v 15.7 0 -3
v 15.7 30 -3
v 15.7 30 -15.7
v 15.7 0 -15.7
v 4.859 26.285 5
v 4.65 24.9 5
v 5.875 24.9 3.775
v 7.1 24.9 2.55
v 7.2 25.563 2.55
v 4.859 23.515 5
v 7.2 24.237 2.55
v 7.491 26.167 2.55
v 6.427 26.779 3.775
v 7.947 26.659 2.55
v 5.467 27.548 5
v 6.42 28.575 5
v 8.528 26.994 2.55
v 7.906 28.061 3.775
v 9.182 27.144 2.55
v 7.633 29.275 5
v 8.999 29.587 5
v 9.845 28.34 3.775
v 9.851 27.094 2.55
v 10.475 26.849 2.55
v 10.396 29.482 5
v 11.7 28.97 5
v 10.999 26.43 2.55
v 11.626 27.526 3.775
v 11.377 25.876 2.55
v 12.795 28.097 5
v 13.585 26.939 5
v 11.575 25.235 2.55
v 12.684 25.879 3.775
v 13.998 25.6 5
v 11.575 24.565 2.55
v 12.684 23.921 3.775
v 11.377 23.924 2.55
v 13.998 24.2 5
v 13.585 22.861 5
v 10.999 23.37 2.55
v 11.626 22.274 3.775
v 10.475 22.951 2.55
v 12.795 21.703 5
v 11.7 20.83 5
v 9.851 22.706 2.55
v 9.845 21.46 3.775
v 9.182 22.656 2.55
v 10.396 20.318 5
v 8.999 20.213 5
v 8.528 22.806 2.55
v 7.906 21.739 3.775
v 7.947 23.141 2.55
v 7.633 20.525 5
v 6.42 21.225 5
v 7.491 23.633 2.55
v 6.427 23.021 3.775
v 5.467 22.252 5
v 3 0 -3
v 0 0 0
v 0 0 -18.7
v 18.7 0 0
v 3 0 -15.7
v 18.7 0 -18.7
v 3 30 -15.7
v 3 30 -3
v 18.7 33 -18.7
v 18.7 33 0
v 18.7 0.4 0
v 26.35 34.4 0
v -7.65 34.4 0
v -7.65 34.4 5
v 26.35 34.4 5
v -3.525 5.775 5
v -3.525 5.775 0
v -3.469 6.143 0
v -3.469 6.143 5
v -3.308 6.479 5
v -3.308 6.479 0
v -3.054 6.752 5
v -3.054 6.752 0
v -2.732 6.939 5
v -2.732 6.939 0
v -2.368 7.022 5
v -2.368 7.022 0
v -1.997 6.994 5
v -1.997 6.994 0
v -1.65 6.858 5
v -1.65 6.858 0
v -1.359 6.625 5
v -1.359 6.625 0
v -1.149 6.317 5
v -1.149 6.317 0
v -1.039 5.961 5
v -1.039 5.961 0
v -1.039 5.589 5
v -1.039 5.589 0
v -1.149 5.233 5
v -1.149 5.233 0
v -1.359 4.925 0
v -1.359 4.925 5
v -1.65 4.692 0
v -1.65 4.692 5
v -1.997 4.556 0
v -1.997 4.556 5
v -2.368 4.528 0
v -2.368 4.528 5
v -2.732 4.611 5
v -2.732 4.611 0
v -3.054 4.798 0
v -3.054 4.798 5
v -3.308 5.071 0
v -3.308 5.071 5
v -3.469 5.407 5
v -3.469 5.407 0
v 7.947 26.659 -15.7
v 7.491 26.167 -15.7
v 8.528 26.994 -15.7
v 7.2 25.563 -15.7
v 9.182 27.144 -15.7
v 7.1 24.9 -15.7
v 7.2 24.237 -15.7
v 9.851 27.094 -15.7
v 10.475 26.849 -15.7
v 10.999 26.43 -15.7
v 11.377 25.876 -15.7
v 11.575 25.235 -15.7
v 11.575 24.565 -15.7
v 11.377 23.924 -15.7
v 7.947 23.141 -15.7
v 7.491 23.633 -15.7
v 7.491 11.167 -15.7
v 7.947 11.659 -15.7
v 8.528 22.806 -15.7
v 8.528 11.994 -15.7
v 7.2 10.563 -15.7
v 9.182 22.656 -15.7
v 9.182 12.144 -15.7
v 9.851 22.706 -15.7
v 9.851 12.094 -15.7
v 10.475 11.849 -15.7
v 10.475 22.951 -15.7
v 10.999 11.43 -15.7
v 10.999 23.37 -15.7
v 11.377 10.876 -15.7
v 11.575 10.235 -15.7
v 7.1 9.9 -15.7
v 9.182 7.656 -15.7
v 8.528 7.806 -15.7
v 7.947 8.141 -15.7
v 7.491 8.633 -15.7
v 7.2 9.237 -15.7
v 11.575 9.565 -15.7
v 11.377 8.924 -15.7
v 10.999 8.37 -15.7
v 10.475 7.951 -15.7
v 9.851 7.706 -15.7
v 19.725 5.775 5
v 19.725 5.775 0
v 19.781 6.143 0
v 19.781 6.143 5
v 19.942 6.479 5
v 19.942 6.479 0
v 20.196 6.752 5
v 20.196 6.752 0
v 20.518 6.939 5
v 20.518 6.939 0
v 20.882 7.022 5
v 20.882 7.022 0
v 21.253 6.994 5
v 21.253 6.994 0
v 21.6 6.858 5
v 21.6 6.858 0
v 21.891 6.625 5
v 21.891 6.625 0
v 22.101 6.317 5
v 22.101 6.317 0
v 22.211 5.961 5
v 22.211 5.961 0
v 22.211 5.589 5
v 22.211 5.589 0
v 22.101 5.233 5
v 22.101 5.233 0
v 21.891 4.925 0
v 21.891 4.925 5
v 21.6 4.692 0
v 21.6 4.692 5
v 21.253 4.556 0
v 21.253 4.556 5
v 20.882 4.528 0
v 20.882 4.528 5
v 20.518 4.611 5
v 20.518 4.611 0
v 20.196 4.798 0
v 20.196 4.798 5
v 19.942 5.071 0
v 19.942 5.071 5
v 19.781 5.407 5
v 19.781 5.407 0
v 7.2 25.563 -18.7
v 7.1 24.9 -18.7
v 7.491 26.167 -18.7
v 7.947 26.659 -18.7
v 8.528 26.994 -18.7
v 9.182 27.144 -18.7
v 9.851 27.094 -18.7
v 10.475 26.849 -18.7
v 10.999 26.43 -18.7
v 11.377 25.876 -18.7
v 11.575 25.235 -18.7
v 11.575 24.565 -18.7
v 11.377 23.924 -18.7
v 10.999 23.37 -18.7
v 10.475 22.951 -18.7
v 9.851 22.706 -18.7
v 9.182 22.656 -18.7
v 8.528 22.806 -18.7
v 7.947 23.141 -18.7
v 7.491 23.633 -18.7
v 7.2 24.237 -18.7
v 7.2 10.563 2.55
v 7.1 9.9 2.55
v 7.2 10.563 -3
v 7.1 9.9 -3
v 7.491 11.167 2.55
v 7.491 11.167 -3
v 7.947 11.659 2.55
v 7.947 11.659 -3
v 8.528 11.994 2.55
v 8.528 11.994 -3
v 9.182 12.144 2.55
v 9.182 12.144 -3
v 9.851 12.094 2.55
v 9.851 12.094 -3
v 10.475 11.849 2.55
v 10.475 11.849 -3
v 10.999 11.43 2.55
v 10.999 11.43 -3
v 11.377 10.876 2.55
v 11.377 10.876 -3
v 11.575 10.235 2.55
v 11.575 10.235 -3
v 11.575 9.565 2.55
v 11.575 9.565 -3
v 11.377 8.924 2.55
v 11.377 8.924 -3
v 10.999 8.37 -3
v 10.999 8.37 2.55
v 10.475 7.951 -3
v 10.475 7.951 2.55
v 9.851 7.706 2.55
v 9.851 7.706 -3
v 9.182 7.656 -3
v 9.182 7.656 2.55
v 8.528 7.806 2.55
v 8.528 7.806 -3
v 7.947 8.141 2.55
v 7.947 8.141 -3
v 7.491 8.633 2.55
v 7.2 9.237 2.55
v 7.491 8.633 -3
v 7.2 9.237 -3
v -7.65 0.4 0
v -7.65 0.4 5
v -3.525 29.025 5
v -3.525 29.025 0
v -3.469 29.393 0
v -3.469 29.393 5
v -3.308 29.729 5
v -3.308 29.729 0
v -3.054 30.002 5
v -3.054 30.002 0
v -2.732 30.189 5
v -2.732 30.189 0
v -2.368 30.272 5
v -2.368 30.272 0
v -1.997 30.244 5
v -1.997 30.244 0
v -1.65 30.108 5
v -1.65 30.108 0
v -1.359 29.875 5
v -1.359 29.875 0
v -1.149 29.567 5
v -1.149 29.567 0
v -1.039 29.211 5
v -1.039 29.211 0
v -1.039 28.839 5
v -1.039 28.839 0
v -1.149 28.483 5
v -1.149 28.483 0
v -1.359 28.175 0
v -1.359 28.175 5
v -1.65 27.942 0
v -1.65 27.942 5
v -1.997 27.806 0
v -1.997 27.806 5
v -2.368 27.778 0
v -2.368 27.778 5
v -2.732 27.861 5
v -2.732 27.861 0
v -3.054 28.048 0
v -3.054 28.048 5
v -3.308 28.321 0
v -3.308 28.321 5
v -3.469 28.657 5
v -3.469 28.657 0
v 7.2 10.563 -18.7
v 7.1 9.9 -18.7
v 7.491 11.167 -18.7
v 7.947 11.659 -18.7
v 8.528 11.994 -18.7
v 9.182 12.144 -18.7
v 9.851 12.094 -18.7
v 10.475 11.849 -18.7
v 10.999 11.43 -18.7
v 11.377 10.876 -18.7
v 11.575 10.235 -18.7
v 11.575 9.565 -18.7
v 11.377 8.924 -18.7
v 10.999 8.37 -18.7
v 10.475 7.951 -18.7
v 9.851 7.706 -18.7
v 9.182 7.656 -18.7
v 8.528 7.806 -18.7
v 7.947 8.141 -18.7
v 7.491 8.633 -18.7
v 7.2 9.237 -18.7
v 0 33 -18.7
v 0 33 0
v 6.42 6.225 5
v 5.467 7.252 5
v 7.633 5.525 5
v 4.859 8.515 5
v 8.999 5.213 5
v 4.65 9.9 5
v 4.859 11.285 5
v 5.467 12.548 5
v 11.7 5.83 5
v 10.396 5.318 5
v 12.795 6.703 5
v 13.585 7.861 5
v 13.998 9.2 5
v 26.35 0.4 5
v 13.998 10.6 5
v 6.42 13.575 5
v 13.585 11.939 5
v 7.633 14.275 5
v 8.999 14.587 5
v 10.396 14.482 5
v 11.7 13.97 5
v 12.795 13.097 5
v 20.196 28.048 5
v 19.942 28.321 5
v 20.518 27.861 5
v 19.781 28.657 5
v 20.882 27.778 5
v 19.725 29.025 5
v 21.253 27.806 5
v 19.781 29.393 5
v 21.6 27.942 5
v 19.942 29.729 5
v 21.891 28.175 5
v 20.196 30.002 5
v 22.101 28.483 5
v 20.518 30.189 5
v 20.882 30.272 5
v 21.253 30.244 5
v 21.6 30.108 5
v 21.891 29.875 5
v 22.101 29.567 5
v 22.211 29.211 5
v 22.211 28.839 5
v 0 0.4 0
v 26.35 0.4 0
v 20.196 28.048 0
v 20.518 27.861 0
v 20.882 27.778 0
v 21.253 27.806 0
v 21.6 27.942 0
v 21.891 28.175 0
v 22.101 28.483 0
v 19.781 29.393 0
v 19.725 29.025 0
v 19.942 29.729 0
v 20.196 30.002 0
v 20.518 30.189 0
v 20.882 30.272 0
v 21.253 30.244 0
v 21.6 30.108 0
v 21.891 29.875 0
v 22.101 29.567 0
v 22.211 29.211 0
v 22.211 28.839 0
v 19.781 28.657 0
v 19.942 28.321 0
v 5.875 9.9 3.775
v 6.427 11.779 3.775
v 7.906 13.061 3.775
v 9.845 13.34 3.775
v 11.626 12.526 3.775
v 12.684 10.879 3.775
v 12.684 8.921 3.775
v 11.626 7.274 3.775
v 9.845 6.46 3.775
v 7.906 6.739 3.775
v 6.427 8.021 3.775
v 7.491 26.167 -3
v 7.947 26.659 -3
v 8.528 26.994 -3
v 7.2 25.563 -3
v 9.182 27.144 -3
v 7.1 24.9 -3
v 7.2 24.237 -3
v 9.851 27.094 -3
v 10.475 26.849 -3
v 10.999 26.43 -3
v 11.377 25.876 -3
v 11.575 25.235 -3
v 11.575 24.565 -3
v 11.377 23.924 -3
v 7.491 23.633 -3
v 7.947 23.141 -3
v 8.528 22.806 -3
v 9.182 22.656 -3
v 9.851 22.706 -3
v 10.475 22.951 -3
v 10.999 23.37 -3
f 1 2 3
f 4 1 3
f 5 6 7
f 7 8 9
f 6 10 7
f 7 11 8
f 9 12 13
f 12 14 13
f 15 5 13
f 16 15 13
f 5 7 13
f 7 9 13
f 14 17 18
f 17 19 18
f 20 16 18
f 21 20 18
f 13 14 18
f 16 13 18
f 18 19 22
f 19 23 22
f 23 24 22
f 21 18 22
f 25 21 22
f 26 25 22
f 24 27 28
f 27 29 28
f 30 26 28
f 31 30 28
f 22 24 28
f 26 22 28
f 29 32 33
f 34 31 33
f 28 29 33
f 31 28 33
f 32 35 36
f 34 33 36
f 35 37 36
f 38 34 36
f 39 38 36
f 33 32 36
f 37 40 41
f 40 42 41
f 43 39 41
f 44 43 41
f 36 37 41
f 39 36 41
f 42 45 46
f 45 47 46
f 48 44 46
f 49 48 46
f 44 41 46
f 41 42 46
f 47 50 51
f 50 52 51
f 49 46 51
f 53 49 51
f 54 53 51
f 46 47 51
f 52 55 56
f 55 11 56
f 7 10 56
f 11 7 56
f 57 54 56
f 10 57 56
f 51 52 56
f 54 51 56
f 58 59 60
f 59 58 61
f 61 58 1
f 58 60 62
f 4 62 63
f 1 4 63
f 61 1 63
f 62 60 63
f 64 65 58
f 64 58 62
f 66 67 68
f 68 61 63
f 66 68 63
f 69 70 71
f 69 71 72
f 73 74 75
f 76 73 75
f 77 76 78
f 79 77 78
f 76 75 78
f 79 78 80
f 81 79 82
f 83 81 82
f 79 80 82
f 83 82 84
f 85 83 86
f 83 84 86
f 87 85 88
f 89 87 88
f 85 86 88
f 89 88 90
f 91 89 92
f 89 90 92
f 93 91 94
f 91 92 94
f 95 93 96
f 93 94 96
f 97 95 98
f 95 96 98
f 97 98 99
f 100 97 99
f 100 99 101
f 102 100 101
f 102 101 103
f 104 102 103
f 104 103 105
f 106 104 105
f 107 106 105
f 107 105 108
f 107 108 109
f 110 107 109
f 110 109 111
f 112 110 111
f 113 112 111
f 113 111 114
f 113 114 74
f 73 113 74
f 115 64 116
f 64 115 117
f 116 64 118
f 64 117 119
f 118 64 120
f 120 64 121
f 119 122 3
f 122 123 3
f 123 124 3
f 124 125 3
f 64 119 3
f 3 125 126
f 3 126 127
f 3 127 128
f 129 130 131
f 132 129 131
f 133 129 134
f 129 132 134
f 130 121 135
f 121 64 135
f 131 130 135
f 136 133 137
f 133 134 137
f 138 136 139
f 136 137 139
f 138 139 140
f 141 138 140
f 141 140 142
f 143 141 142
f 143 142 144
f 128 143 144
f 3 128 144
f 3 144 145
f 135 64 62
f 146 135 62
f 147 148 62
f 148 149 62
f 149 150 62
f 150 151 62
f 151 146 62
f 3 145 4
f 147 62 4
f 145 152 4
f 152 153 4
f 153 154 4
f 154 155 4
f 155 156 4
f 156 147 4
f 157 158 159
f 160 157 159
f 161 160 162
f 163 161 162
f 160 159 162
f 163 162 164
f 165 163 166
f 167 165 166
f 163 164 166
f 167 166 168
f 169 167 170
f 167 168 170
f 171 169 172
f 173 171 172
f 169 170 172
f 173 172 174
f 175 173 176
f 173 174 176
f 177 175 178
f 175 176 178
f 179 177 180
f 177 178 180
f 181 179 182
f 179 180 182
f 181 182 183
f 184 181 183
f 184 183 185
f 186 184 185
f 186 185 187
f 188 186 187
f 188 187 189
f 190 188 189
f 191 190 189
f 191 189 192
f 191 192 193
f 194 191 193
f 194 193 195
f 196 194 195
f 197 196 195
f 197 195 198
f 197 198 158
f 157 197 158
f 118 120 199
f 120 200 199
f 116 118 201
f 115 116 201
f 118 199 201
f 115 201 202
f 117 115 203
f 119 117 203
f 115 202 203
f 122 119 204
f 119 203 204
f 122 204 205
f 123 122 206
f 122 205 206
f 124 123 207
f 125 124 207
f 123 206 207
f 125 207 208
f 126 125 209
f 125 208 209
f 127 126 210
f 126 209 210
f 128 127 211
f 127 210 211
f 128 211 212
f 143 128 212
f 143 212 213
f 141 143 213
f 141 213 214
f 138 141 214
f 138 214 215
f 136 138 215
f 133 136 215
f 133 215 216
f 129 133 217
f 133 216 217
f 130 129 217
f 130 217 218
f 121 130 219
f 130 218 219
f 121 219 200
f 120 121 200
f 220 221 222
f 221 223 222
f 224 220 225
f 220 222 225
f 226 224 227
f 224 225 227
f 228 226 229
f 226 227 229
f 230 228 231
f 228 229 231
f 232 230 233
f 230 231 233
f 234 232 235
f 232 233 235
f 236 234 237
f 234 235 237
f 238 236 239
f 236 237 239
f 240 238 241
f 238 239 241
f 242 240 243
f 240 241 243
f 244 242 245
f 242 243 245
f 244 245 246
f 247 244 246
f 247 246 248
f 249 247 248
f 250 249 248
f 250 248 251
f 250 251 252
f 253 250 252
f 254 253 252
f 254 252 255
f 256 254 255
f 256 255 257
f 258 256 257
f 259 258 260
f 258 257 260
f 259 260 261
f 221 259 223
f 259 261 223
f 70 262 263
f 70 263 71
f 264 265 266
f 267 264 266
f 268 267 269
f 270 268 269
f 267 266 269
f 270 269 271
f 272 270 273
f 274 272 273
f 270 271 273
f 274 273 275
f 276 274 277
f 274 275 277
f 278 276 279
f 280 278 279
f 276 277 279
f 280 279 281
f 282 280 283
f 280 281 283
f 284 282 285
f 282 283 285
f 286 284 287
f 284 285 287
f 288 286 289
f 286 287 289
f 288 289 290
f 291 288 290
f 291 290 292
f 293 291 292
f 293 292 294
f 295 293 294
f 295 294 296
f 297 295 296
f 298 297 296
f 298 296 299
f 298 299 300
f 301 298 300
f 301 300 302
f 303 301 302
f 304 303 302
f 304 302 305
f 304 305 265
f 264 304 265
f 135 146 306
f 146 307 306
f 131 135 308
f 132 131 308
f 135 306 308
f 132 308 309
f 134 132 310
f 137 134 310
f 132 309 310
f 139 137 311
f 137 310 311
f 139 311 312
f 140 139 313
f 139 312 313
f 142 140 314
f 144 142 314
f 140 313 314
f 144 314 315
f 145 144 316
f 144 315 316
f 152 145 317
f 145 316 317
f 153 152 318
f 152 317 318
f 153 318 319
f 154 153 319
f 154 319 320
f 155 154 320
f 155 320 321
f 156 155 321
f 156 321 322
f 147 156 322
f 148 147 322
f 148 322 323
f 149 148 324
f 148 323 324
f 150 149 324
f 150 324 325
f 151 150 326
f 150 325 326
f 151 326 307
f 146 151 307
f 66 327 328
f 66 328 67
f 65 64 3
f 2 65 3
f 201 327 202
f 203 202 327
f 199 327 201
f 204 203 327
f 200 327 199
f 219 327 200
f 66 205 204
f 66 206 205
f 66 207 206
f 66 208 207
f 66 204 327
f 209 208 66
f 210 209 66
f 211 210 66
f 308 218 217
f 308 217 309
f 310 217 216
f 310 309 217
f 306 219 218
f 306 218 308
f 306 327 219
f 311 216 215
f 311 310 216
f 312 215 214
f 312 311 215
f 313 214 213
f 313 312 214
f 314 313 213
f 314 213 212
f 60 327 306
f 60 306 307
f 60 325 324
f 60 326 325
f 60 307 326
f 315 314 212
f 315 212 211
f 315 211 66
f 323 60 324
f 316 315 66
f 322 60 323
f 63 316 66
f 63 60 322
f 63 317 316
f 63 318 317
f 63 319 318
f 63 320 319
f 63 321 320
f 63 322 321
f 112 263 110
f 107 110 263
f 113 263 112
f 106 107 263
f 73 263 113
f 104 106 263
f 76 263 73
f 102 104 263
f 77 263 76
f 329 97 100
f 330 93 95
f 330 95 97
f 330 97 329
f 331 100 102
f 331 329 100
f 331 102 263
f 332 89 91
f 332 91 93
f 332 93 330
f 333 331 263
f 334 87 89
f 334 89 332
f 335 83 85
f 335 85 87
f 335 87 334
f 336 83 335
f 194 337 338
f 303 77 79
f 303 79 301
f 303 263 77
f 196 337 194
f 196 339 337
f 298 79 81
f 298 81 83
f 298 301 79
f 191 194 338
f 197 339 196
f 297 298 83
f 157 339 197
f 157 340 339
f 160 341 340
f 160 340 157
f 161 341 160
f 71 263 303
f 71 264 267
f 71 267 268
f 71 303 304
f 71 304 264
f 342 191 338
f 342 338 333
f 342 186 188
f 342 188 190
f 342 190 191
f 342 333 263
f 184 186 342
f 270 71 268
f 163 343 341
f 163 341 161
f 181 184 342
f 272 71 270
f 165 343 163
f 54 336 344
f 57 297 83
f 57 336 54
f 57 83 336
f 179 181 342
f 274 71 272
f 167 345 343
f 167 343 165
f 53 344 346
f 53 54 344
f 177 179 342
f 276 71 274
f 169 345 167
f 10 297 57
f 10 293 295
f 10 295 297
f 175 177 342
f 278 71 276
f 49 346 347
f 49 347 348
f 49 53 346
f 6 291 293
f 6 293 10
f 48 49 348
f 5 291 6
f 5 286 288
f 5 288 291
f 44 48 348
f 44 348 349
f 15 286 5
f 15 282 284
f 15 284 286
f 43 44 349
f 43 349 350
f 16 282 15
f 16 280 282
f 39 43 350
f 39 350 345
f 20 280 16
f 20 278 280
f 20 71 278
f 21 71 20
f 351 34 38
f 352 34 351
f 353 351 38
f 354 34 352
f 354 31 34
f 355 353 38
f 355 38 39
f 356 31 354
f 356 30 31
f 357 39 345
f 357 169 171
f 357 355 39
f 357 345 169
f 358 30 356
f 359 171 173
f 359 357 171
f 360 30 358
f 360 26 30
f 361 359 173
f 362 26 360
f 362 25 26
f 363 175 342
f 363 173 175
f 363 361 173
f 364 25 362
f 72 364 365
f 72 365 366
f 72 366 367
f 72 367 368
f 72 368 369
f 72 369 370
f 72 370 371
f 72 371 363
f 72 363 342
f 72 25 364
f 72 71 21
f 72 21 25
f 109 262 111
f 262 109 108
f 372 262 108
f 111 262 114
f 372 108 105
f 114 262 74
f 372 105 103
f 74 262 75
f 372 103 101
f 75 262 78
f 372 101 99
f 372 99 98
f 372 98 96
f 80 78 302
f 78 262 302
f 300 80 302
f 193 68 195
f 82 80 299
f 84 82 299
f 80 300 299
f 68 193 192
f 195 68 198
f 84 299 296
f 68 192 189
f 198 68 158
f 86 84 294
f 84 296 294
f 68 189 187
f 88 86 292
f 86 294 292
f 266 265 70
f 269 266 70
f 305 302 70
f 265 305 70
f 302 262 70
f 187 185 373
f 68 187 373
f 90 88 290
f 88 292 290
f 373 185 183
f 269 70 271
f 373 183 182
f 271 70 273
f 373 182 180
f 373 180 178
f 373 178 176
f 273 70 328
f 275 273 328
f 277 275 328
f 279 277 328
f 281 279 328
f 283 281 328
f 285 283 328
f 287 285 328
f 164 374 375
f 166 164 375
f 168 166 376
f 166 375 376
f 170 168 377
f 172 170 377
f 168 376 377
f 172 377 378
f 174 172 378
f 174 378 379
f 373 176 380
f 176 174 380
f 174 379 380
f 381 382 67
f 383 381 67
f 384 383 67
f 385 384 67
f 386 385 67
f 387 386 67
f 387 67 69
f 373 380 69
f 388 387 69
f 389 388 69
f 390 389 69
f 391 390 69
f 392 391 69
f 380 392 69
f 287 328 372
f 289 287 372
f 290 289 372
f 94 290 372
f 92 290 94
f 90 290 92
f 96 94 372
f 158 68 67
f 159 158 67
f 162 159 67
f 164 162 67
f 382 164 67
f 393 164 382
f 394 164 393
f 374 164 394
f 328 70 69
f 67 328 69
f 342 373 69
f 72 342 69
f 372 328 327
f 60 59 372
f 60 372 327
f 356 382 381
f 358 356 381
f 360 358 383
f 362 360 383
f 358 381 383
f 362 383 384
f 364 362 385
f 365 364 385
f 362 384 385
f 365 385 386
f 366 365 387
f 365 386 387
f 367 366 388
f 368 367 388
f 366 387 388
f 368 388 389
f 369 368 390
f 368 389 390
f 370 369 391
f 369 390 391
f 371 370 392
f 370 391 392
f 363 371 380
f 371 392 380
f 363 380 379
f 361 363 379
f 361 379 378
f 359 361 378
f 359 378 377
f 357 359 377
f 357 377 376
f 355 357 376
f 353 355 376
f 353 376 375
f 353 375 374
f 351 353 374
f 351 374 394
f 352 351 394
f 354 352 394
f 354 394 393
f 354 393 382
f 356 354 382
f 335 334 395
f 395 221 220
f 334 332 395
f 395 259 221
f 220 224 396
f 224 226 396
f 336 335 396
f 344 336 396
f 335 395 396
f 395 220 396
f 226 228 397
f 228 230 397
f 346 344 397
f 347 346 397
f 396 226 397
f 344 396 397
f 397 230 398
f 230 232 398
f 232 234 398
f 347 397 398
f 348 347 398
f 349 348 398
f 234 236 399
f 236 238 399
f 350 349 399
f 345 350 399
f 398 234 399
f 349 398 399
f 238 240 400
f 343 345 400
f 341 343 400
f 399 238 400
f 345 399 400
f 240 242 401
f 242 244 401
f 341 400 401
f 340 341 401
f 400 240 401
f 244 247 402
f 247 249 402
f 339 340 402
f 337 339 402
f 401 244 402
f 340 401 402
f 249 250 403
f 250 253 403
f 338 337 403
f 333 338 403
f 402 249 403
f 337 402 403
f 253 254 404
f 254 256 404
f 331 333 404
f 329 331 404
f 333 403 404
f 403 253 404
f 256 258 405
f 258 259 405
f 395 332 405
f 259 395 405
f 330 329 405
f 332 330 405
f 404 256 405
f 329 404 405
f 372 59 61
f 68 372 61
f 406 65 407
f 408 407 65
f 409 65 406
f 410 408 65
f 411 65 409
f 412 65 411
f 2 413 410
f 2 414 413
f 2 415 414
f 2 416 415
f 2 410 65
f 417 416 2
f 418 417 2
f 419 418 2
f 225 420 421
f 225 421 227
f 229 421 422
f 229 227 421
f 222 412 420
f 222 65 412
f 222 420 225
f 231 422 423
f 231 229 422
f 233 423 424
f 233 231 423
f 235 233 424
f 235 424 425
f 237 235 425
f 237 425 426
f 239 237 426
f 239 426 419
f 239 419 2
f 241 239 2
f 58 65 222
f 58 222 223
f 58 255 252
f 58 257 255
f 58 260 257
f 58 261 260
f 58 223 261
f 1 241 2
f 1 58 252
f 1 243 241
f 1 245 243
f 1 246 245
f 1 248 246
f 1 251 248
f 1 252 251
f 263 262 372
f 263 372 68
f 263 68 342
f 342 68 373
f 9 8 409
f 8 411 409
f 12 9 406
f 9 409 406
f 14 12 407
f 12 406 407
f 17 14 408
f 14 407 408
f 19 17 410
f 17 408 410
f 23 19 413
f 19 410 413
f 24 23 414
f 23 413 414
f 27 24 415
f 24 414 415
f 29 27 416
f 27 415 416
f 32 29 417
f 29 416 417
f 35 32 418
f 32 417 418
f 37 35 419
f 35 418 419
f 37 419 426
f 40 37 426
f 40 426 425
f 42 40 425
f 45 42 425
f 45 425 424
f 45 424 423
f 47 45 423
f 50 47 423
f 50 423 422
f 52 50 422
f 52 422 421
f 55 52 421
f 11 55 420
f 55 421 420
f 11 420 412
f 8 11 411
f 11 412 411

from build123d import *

# Parameters (mm, degrees)
SKETCH3_W                                       = 18.7
SKETCH3_H                                       = 18.7
SKETCH3_W_2                                     = 12.7
SKETCH3_H_2                                     = 12.7
BOSS_EXTRUDE2_DEPTH                             = 30
SKETCH4_W                                       = 18.7
SKETCH4_H                                       = 18.7
BOSS_EXTRUDE3_DEPTH                             = 3
SKETCH9_W                                       = 34
SKETCH9_H                                       = 34
BOSS_EXTRUDE4_DEPTH                             = 5
CSK_FOR_M4_FLAT_HEAD_MACHINE_SCREW3_D           = 4.5
CSK_FOR_M4_FLAT_HEAD_MACHINE_SCREW3_CSINK_D     = 9.4
CSK_FOR_M4_FLAT_HEAD_MACHINE_SCREW3_CSINK_ANGLE = 90
TAP_DRILL_FOR_M3X0_5_TAP1_D                     = 2.5


with BuildPart() as part:
    # Sketch3 → Boss-Extrude2 (new body)
    with BuildSketch(Plane(origin=(0, 0, 0), x_dir=(1, 0, 0), z_dir=(0, 1, 0))):
        with Locations((9.35, 9.35)):
            Rectangle(SKETCH3_W, SKETCH3_H)
        with Locations((9.35, 9.35)):
            Rectangle(SKETCH3_W_2, SKETCH3_H_2, mode=Mode.SUBTRACT)
    extrude(amount=BOSS_EXTRUDE2_DEPTH)

    # Sketch4 → Boss-Extrude3 (add)
    with BuildSketch(Plane(origin=(0, 30, 0), x_dir=(1, 0, 0), z_dir=(0, 1, 0))):
        with Locations((9.35, 9.35)):
            Rectangle(SKETCH4_W, SKETCH4_H)
    extrude(amount=BOSS_EXTRUDE3_DEPTH)

    # Sketch9 → Boss-Extrude4 (add)
    with BuildSketch(Plane.XY):
        with Locations((9.35, 17.4)):
            Rectangle(SKETCH9_W, SKETCH9_H)
    extrude(amount=BOSS_EXTRUDE4_DEPTH)

    # CSK for M4 Flat Head Machine Screw3 (through all)
    with Locations(Plane(origin=(9.35, 24.9, 5), x_dir=(1, 0, 0), z_dir=(0, 0, 1))):
        with Locations((0, 0), (0, -15)):
            CounterSinkHole(CSK_FOR_M4_FLAT_HEAD_MACHINE_SCREW3_D / 2, CSK_FOR_M4_FLAT_HEAD_MACHINE_SCREW3_CSINK_D / 2, counter_sink_angle=CSK_FOR_M4_FLAT_HEAD_MACHINE_SCREW3_CSINK_ANGLE)

    # Tap Drill for M3x0.5 Tap1 (through all)
    with Locations(Plane(origin=(-2.275, 29.025, 5), x_dir=(1, 0, 0), z_dir=(0, 0, 1))):
        with Locations((0, 0), (23.25, 0), (0, -23.25), (23.25, -23.25)):
            Hole(TAP_DRILL_FOR_M3X0_5_TAP1_D / 2)


solid = part.part
